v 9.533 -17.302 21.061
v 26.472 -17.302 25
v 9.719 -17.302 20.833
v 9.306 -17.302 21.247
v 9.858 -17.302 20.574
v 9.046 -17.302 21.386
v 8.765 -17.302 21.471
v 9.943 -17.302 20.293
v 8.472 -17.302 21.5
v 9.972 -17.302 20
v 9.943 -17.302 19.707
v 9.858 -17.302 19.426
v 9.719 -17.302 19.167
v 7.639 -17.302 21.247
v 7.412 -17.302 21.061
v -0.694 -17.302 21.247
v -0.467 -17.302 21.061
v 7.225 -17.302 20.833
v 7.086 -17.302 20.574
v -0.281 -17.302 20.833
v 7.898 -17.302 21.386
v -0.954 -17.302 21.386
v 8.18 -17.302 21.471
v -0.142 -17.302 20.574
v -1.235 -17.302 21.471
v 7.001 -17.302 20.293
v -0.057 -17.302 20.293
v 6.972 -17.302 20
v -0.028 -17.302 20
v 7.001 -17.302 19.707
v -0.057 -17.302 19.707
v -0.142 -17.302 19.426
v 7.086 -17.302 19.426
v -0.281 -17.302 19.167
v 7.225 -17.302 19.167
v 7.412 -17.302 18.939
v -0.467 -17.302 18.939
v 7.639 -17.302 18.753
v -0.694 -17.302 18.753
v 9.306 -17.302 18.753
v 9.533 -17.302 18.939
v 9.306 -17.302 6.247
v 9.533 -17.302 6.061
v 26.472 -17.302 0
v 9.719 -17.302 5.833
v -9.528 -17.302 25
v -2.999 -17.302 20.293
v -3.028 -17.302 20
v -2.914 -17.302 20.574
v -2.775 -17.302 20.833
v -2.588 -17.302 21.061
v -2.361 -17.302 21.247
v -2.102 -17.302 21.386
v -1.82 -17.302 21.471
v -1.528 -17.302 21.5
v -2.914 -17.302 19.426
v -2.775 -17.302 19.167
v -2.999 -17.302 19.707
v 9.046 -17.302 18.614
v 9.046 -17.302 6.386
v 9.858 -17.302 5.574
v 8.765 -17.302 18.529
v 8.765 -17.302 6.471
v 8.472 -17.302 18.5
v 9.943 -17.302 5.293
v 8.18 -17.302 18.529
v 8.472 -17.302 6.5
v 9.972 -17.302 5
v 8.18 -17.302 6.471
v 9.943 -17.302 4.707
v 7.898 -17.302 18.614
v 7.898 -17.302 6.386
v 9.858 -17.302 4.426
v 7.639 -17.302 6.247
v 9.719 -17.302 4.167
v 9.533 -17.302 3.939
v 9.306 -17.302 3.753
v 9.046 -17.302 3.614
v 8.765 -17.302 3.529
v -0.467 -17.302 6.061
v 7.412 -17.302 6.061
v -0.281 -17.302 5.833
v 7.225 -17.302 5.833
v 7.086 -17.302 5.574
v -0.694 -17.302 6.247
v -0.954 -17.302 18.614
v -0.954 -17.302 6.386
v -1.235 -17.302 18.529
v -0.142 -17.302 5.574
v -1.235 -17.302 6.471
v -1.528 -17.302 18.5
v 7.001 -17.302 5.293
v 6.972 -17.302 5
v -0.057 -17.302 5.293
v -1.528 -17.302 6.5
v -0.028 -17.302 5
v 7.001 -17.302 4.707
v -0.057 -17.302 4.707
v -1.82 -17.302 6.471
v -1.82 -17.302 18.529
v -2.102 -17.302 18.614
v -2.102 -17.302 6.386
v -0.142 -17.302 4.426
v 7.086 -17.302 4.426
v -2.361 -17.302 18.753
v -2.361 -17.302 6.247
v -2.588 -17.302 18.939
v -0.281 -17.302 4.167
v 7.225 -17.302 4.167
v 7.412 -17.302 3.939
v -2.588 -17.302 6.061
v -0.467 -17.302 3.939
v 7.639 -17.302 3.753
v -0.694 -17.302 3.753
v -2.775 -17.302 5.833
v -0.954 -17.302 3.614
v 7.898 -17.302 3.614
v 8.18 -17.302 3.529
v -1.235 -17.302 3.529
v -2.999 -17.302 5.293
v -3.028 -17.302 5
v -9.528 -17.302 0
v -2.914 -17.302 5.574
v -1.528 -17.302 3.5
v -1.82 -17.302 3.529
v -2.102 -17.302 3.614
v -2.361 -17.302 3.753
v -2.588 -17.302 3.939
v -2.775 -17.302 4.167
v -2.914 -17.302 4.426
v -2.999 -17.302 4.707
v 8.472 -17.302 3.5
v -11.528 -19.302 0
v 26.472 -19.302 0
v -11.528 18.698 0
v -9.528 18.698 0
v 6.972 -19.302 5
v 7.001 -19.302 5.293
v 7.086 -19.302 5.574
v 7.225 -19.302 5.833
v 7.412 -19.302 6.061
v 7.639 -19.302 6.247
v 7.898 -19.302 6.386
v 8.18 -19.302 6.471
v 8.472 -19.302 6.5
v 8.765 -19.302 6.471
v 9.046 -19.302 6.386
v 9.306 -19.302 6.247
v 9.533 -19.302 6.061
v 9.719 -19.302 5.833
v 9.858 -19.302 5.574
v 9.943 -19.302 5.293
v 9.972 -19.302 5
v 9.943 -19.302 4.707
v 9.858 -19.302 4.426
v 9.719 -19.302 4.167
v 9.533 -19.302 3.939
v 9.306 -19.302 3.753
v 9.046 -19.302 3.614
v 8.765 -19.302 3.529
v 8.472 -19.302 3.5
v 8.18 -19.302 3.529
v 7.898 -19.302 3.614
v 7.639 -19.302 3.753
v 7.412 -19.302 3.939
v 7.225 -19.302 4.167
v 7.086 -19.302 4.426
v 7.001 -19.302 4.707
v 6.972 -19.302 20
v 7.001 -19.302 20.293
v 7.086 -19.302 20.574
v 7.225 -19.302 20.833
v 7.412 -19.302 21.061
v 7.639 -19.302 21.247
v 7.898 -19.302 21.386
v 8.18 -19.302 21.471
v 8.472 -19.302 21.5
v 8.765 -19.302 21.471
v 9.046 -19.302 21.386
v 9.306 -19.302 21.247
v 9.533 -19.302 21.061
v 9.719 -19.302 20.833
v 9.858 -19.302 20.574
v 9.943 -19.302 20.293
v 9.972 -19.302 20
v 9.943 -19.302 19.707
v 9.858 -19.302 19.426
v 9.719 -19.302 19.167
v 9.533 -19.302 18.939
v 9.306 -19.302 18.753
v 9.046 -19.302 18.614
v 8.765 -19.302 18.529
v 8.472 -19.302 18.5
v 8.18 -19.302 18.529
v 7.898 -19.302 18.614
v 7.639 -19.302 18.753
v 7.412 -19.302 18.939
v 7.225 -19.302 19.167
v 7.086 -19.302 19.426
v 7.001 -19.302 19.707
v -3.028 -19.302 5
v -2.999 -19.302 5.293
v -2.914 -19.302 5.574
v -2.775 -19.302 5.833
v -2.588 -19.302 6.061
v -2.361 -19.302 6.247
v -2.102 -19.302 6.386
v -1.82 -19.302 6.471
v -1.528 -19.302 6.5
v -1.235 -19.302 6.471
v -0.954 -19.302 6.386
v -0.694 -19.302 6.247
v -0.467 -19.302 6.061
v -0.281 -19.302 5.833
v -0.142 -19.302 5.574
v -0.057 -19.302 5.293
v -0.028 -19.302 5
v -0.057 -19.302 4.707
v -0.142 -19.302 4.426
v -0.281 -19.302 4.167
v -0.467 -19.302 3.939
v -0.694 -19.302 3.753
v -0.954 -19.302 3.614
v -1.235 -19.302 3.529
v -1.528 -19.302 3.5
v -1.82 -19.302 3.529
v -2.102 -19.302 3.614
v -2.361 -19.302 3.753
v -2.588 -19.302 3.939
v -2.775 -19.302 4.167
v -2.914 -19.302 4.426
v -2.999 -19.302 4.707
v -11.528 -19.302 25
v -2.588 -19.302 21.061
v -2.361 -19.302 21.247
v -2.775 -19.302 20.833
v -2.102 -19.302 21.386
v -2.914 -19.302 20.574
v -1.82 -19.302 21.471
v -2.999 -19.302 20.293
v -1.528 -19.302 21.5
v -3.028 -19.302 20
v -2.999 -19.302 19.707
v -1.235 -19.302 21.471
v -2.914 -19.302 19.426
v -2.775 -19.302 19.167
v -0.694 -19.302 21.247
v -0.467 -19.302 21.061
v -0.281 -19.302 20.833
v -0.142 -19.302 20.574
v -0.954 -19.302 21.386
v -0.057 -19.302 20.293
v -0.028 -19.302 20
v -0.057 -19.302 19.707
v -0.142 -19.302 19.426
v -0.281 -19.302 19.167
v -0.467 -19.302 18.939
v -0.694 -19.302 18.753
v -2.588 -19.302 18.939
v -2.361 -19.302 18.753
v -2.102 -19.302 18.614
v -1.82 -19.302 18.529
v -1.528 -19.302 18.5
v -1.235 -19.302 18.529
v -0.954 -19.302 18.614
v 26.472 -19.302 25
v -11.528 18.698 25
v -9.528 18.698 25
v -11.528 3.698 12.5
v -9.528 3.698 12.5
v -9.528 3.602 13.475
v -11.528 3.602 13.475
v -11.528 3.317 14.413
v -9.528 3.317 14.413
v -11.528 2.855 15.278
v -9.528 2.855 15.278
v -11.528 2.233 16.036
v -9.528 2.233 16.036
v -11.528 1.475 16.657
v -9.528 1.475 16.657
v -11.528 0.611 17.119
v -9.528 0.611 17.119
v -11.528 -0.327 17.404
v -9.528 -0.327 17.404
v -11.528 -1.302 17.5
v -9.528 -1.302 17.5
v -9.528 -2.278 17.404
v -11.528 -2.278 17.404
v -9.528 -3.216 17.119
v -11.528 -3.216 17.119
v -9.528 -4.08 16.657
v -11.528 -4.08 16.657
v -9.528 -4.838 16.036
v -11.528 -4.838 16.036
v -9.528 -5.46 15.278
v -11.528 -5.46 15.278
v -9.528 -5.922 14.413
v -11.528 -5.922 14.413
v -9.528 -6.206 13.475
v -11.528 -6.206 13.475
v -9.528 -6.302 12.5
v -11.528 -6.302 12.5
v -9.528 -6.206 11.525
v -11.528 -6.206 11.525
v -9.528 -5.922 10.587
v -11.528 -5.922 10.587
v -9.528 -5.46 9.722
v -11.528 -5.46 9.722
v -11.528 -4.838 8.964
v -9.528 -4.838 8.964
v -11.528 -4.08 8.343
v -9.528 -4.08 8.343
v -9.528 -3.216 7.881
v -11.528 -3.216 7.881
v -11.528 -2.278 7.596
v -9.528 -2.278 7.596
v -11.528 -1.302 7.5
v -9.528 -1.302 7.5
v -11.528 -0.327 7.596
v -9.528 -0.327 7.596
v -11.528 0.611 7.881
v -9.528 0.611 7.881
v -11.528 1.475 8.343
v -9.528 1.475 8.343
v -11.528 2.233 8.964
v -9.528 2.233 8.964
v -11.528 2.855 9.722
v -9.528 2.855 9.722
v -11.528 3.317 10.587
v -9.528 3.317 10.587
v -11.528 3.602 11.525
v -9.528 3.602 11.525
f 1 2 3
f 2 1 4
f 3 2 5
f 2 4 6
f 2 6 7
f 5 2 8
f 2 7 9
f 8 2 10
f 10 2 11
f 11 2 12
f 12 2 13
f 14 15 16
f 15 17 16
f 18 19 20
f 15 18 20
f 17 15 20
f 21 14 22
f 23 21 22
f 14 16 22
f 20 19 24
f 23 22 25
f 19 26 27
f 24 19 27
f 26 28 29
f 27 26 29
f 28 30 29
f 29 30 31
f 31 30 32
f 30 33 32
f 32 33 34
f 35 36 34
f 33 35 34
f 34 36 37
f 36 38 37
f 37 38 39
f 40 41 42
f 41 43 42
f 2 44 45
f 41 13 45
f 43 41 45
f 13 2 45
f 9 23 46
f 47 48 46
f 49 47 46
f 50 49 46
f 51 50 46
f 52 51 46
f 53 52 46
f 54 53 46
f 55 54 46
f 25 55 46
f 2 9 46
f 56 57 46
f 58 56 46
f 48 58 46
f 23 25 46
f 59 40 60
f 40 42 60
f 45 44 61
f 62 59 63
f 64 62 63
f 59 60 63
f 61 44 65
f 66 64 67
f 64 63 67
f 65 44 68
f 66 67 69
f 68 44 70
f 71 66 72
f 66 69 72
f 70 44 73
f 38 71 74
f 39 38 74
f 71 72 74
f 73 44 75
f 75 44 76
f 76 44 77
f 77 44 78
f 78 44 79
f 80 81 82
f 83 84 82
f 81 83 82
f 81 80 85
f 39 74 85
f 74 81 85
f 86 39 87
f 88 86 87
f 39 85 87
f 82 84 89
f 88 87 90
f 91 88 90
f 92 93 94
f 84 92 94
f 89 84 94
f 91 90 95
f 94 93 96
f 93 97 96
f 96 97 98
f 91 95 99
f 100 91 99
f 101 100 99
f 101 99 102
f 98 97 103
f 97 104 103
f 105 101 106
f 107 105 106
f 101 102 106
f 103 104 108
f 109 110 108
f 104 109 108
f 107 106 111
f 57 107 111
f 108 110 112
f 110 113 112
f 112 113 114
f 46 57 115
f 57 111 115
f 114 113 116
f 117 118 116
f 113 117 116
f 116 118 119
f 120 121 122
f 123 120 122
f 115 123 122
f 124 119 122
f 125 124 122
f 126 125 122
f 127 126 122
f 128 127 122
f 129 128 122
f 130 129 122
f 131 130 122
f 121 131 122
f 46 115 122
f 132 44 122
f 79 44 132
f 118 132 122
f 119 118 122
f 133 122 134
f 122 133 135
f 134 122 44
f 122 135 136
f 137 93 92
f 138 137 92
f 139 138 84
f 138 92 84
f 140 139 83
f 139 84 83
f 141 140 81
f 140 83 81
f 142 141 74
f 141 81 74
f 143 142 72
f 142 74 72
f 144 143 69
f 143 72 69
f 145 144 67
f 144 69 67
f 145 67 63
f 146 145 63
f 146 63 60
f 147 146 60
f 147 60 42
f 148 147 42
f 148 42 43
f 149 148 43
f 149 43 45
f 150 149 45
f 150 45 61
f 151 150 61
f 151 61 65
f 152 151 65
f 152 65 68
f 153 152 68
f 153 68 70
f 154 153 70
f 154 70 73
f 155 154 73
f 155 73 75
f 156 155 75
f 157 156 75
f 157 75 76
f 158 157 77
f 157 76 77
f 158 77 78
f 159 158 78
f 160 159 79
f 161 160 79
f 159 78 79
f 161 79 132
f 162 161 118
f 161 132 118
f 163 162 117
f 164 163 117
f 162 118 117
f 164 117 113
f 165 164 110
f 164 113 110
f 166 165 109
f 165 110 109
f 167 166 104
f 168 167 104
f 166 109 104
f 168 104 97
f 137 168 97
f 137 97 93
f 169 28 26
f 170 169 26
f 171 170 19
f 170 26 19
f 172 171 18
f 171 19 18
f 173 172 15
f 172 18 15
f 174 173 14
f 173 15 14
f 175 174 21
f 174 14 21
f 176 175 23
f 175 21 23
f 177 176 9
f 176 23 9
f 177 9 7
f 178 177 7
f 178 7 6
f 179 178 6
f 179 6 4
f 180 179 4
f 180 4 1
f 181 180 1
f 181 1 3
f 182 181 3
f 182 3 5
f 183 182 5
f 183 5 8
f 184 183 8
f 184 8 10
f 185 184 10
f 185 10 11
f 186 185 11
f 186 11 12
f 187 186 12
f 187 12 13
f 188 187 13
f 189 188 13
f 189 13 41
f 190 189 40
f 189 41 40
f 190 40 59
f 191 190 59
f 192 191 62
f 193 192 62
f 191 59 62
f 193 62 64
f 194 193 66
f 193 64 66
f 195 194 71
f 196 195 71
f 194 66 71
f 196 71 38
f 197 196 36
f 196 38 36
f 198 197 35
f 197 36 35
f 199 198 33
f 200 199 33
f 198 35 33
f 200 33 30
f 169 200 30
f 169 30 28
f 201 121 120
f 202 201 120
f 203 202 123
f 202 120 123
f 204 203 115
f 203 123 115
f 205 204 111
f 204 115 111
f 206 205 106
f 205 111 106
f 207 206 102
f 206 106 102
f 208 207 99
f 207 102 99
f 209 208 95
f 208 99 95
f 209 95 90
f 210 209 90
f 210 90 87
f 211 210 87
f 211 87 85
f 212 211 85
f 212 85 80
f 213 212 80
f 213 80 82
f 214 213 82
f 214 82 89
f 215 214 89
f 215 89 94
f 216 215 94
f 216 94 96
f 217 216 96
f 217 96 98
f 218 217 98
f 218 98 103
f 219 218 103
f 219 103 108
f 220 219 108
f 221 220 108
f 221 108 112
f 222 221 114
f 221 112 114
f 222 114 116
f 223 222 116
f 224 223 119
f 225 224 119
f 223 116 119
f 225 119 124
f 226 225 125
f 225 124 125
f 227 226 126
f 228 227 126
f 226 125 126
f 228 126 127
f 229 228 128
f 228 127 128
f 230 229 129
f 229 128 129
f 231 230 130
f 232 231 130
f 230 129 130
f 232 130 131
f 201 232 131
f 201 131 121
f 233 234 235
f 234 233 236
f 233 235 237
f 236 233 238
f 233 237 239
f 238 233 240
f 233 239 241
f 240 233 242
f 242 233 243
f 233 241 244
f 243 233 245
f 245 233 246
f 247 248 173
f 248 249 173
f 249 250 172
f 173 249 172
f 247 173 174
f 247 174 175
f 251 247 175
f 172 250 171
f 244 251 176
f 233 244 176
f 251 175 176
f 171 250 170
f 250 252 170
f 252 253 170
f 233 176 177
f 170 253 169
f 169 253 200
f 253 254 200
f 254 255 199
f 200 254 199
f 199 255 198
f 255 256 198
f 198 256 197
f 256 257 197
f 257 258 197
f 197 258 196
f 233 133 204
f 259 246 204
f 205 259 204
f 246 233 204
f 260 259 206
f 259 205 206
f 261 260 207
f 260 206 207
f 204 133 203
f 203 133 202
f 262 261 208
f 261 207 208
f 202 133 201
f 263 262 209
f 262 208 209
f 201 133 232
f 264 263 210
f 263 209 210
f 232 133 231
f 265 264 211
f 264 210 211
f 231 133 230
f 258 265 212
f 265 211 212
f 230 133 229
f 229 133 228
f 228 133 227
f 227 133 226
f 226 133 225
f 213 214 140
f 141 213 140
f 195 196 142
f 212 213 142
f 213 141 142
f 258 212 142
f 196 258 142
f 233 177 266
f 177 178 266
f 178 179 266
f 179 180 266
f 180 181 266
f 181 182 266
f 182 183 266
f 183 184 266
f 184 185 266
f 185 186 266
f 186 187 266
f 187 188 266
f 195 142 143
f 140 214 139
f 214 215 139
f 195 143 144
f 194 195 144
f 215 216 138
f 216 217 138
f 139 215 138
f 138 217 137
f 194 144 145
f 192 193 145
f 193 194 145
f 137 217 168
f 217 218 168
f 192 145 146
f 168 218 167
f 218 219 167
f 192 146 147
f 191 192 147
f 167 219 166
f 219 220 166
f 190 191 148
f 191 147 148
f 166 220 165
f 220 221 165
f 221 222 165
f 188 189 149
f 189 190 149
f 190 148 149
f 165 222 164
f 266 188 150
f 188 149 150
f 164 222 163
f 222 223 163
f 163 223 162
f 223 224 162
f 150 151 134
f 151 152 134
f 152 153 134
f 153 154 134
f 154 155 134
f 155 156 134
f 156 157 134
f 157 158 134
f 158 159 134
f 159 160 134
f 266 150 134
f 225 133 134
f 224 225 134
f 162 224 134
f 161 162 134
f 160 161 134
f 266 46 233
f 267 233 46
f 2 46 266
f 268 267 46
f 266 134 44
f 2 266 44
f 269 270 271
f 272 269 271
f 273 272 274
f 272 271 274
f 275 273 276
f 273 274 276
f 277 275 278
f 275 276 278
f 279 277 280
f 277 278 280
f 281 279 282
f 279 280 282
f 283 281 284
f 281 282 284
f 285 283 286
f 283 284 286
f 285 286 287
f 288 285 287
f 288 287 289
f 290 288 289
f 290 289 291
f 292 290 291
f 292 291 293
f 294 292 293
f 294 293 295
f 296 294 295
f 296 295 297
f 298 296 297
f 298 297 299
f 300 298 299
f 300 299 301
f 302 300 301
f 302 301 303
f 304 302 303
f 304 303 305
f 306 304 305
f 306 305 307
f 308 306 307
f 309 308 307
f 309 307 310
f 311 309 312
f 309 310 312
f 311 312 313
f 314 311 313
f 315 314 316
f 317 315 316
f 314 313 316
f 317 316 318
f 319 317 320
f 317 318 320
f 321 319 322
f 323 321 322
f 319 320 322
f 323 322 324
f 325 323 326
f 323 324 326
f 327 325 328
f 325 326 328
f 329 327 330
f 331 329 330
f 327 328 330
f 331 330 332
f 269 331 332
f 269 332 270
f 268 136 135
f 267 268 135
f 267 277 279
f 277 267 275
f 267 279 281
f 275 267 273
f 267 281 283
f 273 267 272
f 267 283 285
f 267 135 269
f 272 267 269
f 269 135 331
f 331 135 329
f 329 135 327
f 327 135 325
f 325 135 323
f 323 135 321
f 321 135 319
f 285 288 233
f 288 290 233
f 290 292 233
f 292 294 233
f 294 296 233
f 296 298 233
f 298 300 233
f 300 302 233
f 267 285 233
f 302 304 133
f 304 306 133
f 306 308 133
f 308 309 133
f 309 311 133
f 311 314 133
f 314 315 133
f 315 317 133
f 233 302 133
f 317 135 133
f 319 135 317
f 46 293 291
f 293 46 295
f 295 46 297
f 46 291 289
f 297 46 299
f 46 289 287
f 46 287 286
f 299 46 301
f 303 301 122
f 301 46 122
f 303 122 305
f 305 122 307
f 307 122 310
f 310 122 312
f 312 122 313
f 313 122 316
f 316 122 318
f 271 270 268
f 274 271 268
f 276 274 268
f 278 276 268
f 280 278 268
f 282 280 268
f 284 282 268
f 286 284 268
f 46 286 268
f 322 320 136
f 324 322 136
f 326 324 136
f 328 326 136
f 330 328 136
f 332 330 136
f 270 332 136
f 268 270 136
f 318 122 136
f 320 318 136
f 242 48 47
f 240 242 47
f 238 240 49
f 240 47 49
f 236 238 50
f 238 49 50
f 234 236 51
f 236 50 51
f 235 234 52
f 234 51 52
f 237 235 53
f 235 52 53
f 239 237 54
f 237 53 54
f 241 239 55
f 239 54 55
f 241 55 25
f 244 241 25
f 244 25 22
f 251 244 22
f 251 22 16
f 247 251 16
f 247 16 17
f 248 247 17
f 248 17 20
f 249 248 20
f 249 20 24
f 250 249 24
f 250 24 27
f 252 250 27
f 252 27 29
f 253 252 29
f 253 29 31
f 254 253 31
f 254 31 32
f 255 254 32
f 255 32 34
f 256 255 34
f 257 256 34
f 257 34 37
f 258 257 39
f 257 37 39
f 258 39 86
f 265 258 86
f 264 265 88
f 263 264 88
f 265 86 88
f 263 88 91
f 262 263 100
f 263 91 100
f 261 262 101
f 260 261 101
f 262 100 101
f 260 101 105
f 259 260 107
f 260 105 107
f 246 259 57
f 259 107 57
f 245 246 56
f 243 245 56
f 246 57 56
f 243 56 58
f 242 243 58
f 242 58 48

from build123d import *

# Parameters (mm, degrees)
EXTRUDE_1_DEPTH     = 25
SKETCH_2_R          = 1.5
CUT_EXTRUDE_1_DEPTH = 52.203275929
SKETCH_3_R          = 5
CUT_EXTRUDE_2_DEPTH = 48.891361585


with BuildPart() as part:
    # 草图1 → 凸台-拉伸1 (new body)
    with BuildSketch(Plane.XY):
        Polygon((-11.527836019, 18.697603401), (-11.527836019, -19.302396599), (26.472163981, -19.302396599), (26.472163981, -17.302396599), (-9.527836019, -17.302396599), (-9.527836019, 18.697603401), align=None)
    extrude(amount=EXTRUDE_1_DEPTH)

    # 草图2 → 切除-拉伸1 (cut, through all)
    with BuildSketch(Plane(origin=(0, -17.302396599, 0), x_dir=(1, 0, 0), z_dir=(0, 1, 0))):
        with Locations(Location((-1.527836019, -5, 0), (0, 0, 180))):
            Circle(SKETCH_2_R)
        with Locations(Location((8.472163981, -5, 0), (0, 0, 180))):
            Circle(SKETCH_2_R)
        with Locations(Location((8.472163981, -20, 0), (0, 0, 180))):
            Circle(SKETCH_2_R)
        with Locations(Location((-1.527836019, -20, 0), (0, 0, 180))):
            Circle(SKETCH_2_R)
    extrude(amount=-CUT_EXTRUDE_1_DEPTH, mode=Mode.SUBTRACT)

    # 草图3 → 切除-拉伸2 (cut, through all)
    with BuildSketch(Plane(origin=(-9.527836019, 0, 0), x_dir=(0, 0, -1), z_dir=(1, 0, 0))):
        with Locations(Location((-12.5, -1.302396599, 0), (0, 0, 90))):
            Circle(SKETCH_3_R)
    extrude(amount=-CUT_EXTRUDE_2_DEPTH, mode=Mode.SUBTRACT)


solid = part.part
